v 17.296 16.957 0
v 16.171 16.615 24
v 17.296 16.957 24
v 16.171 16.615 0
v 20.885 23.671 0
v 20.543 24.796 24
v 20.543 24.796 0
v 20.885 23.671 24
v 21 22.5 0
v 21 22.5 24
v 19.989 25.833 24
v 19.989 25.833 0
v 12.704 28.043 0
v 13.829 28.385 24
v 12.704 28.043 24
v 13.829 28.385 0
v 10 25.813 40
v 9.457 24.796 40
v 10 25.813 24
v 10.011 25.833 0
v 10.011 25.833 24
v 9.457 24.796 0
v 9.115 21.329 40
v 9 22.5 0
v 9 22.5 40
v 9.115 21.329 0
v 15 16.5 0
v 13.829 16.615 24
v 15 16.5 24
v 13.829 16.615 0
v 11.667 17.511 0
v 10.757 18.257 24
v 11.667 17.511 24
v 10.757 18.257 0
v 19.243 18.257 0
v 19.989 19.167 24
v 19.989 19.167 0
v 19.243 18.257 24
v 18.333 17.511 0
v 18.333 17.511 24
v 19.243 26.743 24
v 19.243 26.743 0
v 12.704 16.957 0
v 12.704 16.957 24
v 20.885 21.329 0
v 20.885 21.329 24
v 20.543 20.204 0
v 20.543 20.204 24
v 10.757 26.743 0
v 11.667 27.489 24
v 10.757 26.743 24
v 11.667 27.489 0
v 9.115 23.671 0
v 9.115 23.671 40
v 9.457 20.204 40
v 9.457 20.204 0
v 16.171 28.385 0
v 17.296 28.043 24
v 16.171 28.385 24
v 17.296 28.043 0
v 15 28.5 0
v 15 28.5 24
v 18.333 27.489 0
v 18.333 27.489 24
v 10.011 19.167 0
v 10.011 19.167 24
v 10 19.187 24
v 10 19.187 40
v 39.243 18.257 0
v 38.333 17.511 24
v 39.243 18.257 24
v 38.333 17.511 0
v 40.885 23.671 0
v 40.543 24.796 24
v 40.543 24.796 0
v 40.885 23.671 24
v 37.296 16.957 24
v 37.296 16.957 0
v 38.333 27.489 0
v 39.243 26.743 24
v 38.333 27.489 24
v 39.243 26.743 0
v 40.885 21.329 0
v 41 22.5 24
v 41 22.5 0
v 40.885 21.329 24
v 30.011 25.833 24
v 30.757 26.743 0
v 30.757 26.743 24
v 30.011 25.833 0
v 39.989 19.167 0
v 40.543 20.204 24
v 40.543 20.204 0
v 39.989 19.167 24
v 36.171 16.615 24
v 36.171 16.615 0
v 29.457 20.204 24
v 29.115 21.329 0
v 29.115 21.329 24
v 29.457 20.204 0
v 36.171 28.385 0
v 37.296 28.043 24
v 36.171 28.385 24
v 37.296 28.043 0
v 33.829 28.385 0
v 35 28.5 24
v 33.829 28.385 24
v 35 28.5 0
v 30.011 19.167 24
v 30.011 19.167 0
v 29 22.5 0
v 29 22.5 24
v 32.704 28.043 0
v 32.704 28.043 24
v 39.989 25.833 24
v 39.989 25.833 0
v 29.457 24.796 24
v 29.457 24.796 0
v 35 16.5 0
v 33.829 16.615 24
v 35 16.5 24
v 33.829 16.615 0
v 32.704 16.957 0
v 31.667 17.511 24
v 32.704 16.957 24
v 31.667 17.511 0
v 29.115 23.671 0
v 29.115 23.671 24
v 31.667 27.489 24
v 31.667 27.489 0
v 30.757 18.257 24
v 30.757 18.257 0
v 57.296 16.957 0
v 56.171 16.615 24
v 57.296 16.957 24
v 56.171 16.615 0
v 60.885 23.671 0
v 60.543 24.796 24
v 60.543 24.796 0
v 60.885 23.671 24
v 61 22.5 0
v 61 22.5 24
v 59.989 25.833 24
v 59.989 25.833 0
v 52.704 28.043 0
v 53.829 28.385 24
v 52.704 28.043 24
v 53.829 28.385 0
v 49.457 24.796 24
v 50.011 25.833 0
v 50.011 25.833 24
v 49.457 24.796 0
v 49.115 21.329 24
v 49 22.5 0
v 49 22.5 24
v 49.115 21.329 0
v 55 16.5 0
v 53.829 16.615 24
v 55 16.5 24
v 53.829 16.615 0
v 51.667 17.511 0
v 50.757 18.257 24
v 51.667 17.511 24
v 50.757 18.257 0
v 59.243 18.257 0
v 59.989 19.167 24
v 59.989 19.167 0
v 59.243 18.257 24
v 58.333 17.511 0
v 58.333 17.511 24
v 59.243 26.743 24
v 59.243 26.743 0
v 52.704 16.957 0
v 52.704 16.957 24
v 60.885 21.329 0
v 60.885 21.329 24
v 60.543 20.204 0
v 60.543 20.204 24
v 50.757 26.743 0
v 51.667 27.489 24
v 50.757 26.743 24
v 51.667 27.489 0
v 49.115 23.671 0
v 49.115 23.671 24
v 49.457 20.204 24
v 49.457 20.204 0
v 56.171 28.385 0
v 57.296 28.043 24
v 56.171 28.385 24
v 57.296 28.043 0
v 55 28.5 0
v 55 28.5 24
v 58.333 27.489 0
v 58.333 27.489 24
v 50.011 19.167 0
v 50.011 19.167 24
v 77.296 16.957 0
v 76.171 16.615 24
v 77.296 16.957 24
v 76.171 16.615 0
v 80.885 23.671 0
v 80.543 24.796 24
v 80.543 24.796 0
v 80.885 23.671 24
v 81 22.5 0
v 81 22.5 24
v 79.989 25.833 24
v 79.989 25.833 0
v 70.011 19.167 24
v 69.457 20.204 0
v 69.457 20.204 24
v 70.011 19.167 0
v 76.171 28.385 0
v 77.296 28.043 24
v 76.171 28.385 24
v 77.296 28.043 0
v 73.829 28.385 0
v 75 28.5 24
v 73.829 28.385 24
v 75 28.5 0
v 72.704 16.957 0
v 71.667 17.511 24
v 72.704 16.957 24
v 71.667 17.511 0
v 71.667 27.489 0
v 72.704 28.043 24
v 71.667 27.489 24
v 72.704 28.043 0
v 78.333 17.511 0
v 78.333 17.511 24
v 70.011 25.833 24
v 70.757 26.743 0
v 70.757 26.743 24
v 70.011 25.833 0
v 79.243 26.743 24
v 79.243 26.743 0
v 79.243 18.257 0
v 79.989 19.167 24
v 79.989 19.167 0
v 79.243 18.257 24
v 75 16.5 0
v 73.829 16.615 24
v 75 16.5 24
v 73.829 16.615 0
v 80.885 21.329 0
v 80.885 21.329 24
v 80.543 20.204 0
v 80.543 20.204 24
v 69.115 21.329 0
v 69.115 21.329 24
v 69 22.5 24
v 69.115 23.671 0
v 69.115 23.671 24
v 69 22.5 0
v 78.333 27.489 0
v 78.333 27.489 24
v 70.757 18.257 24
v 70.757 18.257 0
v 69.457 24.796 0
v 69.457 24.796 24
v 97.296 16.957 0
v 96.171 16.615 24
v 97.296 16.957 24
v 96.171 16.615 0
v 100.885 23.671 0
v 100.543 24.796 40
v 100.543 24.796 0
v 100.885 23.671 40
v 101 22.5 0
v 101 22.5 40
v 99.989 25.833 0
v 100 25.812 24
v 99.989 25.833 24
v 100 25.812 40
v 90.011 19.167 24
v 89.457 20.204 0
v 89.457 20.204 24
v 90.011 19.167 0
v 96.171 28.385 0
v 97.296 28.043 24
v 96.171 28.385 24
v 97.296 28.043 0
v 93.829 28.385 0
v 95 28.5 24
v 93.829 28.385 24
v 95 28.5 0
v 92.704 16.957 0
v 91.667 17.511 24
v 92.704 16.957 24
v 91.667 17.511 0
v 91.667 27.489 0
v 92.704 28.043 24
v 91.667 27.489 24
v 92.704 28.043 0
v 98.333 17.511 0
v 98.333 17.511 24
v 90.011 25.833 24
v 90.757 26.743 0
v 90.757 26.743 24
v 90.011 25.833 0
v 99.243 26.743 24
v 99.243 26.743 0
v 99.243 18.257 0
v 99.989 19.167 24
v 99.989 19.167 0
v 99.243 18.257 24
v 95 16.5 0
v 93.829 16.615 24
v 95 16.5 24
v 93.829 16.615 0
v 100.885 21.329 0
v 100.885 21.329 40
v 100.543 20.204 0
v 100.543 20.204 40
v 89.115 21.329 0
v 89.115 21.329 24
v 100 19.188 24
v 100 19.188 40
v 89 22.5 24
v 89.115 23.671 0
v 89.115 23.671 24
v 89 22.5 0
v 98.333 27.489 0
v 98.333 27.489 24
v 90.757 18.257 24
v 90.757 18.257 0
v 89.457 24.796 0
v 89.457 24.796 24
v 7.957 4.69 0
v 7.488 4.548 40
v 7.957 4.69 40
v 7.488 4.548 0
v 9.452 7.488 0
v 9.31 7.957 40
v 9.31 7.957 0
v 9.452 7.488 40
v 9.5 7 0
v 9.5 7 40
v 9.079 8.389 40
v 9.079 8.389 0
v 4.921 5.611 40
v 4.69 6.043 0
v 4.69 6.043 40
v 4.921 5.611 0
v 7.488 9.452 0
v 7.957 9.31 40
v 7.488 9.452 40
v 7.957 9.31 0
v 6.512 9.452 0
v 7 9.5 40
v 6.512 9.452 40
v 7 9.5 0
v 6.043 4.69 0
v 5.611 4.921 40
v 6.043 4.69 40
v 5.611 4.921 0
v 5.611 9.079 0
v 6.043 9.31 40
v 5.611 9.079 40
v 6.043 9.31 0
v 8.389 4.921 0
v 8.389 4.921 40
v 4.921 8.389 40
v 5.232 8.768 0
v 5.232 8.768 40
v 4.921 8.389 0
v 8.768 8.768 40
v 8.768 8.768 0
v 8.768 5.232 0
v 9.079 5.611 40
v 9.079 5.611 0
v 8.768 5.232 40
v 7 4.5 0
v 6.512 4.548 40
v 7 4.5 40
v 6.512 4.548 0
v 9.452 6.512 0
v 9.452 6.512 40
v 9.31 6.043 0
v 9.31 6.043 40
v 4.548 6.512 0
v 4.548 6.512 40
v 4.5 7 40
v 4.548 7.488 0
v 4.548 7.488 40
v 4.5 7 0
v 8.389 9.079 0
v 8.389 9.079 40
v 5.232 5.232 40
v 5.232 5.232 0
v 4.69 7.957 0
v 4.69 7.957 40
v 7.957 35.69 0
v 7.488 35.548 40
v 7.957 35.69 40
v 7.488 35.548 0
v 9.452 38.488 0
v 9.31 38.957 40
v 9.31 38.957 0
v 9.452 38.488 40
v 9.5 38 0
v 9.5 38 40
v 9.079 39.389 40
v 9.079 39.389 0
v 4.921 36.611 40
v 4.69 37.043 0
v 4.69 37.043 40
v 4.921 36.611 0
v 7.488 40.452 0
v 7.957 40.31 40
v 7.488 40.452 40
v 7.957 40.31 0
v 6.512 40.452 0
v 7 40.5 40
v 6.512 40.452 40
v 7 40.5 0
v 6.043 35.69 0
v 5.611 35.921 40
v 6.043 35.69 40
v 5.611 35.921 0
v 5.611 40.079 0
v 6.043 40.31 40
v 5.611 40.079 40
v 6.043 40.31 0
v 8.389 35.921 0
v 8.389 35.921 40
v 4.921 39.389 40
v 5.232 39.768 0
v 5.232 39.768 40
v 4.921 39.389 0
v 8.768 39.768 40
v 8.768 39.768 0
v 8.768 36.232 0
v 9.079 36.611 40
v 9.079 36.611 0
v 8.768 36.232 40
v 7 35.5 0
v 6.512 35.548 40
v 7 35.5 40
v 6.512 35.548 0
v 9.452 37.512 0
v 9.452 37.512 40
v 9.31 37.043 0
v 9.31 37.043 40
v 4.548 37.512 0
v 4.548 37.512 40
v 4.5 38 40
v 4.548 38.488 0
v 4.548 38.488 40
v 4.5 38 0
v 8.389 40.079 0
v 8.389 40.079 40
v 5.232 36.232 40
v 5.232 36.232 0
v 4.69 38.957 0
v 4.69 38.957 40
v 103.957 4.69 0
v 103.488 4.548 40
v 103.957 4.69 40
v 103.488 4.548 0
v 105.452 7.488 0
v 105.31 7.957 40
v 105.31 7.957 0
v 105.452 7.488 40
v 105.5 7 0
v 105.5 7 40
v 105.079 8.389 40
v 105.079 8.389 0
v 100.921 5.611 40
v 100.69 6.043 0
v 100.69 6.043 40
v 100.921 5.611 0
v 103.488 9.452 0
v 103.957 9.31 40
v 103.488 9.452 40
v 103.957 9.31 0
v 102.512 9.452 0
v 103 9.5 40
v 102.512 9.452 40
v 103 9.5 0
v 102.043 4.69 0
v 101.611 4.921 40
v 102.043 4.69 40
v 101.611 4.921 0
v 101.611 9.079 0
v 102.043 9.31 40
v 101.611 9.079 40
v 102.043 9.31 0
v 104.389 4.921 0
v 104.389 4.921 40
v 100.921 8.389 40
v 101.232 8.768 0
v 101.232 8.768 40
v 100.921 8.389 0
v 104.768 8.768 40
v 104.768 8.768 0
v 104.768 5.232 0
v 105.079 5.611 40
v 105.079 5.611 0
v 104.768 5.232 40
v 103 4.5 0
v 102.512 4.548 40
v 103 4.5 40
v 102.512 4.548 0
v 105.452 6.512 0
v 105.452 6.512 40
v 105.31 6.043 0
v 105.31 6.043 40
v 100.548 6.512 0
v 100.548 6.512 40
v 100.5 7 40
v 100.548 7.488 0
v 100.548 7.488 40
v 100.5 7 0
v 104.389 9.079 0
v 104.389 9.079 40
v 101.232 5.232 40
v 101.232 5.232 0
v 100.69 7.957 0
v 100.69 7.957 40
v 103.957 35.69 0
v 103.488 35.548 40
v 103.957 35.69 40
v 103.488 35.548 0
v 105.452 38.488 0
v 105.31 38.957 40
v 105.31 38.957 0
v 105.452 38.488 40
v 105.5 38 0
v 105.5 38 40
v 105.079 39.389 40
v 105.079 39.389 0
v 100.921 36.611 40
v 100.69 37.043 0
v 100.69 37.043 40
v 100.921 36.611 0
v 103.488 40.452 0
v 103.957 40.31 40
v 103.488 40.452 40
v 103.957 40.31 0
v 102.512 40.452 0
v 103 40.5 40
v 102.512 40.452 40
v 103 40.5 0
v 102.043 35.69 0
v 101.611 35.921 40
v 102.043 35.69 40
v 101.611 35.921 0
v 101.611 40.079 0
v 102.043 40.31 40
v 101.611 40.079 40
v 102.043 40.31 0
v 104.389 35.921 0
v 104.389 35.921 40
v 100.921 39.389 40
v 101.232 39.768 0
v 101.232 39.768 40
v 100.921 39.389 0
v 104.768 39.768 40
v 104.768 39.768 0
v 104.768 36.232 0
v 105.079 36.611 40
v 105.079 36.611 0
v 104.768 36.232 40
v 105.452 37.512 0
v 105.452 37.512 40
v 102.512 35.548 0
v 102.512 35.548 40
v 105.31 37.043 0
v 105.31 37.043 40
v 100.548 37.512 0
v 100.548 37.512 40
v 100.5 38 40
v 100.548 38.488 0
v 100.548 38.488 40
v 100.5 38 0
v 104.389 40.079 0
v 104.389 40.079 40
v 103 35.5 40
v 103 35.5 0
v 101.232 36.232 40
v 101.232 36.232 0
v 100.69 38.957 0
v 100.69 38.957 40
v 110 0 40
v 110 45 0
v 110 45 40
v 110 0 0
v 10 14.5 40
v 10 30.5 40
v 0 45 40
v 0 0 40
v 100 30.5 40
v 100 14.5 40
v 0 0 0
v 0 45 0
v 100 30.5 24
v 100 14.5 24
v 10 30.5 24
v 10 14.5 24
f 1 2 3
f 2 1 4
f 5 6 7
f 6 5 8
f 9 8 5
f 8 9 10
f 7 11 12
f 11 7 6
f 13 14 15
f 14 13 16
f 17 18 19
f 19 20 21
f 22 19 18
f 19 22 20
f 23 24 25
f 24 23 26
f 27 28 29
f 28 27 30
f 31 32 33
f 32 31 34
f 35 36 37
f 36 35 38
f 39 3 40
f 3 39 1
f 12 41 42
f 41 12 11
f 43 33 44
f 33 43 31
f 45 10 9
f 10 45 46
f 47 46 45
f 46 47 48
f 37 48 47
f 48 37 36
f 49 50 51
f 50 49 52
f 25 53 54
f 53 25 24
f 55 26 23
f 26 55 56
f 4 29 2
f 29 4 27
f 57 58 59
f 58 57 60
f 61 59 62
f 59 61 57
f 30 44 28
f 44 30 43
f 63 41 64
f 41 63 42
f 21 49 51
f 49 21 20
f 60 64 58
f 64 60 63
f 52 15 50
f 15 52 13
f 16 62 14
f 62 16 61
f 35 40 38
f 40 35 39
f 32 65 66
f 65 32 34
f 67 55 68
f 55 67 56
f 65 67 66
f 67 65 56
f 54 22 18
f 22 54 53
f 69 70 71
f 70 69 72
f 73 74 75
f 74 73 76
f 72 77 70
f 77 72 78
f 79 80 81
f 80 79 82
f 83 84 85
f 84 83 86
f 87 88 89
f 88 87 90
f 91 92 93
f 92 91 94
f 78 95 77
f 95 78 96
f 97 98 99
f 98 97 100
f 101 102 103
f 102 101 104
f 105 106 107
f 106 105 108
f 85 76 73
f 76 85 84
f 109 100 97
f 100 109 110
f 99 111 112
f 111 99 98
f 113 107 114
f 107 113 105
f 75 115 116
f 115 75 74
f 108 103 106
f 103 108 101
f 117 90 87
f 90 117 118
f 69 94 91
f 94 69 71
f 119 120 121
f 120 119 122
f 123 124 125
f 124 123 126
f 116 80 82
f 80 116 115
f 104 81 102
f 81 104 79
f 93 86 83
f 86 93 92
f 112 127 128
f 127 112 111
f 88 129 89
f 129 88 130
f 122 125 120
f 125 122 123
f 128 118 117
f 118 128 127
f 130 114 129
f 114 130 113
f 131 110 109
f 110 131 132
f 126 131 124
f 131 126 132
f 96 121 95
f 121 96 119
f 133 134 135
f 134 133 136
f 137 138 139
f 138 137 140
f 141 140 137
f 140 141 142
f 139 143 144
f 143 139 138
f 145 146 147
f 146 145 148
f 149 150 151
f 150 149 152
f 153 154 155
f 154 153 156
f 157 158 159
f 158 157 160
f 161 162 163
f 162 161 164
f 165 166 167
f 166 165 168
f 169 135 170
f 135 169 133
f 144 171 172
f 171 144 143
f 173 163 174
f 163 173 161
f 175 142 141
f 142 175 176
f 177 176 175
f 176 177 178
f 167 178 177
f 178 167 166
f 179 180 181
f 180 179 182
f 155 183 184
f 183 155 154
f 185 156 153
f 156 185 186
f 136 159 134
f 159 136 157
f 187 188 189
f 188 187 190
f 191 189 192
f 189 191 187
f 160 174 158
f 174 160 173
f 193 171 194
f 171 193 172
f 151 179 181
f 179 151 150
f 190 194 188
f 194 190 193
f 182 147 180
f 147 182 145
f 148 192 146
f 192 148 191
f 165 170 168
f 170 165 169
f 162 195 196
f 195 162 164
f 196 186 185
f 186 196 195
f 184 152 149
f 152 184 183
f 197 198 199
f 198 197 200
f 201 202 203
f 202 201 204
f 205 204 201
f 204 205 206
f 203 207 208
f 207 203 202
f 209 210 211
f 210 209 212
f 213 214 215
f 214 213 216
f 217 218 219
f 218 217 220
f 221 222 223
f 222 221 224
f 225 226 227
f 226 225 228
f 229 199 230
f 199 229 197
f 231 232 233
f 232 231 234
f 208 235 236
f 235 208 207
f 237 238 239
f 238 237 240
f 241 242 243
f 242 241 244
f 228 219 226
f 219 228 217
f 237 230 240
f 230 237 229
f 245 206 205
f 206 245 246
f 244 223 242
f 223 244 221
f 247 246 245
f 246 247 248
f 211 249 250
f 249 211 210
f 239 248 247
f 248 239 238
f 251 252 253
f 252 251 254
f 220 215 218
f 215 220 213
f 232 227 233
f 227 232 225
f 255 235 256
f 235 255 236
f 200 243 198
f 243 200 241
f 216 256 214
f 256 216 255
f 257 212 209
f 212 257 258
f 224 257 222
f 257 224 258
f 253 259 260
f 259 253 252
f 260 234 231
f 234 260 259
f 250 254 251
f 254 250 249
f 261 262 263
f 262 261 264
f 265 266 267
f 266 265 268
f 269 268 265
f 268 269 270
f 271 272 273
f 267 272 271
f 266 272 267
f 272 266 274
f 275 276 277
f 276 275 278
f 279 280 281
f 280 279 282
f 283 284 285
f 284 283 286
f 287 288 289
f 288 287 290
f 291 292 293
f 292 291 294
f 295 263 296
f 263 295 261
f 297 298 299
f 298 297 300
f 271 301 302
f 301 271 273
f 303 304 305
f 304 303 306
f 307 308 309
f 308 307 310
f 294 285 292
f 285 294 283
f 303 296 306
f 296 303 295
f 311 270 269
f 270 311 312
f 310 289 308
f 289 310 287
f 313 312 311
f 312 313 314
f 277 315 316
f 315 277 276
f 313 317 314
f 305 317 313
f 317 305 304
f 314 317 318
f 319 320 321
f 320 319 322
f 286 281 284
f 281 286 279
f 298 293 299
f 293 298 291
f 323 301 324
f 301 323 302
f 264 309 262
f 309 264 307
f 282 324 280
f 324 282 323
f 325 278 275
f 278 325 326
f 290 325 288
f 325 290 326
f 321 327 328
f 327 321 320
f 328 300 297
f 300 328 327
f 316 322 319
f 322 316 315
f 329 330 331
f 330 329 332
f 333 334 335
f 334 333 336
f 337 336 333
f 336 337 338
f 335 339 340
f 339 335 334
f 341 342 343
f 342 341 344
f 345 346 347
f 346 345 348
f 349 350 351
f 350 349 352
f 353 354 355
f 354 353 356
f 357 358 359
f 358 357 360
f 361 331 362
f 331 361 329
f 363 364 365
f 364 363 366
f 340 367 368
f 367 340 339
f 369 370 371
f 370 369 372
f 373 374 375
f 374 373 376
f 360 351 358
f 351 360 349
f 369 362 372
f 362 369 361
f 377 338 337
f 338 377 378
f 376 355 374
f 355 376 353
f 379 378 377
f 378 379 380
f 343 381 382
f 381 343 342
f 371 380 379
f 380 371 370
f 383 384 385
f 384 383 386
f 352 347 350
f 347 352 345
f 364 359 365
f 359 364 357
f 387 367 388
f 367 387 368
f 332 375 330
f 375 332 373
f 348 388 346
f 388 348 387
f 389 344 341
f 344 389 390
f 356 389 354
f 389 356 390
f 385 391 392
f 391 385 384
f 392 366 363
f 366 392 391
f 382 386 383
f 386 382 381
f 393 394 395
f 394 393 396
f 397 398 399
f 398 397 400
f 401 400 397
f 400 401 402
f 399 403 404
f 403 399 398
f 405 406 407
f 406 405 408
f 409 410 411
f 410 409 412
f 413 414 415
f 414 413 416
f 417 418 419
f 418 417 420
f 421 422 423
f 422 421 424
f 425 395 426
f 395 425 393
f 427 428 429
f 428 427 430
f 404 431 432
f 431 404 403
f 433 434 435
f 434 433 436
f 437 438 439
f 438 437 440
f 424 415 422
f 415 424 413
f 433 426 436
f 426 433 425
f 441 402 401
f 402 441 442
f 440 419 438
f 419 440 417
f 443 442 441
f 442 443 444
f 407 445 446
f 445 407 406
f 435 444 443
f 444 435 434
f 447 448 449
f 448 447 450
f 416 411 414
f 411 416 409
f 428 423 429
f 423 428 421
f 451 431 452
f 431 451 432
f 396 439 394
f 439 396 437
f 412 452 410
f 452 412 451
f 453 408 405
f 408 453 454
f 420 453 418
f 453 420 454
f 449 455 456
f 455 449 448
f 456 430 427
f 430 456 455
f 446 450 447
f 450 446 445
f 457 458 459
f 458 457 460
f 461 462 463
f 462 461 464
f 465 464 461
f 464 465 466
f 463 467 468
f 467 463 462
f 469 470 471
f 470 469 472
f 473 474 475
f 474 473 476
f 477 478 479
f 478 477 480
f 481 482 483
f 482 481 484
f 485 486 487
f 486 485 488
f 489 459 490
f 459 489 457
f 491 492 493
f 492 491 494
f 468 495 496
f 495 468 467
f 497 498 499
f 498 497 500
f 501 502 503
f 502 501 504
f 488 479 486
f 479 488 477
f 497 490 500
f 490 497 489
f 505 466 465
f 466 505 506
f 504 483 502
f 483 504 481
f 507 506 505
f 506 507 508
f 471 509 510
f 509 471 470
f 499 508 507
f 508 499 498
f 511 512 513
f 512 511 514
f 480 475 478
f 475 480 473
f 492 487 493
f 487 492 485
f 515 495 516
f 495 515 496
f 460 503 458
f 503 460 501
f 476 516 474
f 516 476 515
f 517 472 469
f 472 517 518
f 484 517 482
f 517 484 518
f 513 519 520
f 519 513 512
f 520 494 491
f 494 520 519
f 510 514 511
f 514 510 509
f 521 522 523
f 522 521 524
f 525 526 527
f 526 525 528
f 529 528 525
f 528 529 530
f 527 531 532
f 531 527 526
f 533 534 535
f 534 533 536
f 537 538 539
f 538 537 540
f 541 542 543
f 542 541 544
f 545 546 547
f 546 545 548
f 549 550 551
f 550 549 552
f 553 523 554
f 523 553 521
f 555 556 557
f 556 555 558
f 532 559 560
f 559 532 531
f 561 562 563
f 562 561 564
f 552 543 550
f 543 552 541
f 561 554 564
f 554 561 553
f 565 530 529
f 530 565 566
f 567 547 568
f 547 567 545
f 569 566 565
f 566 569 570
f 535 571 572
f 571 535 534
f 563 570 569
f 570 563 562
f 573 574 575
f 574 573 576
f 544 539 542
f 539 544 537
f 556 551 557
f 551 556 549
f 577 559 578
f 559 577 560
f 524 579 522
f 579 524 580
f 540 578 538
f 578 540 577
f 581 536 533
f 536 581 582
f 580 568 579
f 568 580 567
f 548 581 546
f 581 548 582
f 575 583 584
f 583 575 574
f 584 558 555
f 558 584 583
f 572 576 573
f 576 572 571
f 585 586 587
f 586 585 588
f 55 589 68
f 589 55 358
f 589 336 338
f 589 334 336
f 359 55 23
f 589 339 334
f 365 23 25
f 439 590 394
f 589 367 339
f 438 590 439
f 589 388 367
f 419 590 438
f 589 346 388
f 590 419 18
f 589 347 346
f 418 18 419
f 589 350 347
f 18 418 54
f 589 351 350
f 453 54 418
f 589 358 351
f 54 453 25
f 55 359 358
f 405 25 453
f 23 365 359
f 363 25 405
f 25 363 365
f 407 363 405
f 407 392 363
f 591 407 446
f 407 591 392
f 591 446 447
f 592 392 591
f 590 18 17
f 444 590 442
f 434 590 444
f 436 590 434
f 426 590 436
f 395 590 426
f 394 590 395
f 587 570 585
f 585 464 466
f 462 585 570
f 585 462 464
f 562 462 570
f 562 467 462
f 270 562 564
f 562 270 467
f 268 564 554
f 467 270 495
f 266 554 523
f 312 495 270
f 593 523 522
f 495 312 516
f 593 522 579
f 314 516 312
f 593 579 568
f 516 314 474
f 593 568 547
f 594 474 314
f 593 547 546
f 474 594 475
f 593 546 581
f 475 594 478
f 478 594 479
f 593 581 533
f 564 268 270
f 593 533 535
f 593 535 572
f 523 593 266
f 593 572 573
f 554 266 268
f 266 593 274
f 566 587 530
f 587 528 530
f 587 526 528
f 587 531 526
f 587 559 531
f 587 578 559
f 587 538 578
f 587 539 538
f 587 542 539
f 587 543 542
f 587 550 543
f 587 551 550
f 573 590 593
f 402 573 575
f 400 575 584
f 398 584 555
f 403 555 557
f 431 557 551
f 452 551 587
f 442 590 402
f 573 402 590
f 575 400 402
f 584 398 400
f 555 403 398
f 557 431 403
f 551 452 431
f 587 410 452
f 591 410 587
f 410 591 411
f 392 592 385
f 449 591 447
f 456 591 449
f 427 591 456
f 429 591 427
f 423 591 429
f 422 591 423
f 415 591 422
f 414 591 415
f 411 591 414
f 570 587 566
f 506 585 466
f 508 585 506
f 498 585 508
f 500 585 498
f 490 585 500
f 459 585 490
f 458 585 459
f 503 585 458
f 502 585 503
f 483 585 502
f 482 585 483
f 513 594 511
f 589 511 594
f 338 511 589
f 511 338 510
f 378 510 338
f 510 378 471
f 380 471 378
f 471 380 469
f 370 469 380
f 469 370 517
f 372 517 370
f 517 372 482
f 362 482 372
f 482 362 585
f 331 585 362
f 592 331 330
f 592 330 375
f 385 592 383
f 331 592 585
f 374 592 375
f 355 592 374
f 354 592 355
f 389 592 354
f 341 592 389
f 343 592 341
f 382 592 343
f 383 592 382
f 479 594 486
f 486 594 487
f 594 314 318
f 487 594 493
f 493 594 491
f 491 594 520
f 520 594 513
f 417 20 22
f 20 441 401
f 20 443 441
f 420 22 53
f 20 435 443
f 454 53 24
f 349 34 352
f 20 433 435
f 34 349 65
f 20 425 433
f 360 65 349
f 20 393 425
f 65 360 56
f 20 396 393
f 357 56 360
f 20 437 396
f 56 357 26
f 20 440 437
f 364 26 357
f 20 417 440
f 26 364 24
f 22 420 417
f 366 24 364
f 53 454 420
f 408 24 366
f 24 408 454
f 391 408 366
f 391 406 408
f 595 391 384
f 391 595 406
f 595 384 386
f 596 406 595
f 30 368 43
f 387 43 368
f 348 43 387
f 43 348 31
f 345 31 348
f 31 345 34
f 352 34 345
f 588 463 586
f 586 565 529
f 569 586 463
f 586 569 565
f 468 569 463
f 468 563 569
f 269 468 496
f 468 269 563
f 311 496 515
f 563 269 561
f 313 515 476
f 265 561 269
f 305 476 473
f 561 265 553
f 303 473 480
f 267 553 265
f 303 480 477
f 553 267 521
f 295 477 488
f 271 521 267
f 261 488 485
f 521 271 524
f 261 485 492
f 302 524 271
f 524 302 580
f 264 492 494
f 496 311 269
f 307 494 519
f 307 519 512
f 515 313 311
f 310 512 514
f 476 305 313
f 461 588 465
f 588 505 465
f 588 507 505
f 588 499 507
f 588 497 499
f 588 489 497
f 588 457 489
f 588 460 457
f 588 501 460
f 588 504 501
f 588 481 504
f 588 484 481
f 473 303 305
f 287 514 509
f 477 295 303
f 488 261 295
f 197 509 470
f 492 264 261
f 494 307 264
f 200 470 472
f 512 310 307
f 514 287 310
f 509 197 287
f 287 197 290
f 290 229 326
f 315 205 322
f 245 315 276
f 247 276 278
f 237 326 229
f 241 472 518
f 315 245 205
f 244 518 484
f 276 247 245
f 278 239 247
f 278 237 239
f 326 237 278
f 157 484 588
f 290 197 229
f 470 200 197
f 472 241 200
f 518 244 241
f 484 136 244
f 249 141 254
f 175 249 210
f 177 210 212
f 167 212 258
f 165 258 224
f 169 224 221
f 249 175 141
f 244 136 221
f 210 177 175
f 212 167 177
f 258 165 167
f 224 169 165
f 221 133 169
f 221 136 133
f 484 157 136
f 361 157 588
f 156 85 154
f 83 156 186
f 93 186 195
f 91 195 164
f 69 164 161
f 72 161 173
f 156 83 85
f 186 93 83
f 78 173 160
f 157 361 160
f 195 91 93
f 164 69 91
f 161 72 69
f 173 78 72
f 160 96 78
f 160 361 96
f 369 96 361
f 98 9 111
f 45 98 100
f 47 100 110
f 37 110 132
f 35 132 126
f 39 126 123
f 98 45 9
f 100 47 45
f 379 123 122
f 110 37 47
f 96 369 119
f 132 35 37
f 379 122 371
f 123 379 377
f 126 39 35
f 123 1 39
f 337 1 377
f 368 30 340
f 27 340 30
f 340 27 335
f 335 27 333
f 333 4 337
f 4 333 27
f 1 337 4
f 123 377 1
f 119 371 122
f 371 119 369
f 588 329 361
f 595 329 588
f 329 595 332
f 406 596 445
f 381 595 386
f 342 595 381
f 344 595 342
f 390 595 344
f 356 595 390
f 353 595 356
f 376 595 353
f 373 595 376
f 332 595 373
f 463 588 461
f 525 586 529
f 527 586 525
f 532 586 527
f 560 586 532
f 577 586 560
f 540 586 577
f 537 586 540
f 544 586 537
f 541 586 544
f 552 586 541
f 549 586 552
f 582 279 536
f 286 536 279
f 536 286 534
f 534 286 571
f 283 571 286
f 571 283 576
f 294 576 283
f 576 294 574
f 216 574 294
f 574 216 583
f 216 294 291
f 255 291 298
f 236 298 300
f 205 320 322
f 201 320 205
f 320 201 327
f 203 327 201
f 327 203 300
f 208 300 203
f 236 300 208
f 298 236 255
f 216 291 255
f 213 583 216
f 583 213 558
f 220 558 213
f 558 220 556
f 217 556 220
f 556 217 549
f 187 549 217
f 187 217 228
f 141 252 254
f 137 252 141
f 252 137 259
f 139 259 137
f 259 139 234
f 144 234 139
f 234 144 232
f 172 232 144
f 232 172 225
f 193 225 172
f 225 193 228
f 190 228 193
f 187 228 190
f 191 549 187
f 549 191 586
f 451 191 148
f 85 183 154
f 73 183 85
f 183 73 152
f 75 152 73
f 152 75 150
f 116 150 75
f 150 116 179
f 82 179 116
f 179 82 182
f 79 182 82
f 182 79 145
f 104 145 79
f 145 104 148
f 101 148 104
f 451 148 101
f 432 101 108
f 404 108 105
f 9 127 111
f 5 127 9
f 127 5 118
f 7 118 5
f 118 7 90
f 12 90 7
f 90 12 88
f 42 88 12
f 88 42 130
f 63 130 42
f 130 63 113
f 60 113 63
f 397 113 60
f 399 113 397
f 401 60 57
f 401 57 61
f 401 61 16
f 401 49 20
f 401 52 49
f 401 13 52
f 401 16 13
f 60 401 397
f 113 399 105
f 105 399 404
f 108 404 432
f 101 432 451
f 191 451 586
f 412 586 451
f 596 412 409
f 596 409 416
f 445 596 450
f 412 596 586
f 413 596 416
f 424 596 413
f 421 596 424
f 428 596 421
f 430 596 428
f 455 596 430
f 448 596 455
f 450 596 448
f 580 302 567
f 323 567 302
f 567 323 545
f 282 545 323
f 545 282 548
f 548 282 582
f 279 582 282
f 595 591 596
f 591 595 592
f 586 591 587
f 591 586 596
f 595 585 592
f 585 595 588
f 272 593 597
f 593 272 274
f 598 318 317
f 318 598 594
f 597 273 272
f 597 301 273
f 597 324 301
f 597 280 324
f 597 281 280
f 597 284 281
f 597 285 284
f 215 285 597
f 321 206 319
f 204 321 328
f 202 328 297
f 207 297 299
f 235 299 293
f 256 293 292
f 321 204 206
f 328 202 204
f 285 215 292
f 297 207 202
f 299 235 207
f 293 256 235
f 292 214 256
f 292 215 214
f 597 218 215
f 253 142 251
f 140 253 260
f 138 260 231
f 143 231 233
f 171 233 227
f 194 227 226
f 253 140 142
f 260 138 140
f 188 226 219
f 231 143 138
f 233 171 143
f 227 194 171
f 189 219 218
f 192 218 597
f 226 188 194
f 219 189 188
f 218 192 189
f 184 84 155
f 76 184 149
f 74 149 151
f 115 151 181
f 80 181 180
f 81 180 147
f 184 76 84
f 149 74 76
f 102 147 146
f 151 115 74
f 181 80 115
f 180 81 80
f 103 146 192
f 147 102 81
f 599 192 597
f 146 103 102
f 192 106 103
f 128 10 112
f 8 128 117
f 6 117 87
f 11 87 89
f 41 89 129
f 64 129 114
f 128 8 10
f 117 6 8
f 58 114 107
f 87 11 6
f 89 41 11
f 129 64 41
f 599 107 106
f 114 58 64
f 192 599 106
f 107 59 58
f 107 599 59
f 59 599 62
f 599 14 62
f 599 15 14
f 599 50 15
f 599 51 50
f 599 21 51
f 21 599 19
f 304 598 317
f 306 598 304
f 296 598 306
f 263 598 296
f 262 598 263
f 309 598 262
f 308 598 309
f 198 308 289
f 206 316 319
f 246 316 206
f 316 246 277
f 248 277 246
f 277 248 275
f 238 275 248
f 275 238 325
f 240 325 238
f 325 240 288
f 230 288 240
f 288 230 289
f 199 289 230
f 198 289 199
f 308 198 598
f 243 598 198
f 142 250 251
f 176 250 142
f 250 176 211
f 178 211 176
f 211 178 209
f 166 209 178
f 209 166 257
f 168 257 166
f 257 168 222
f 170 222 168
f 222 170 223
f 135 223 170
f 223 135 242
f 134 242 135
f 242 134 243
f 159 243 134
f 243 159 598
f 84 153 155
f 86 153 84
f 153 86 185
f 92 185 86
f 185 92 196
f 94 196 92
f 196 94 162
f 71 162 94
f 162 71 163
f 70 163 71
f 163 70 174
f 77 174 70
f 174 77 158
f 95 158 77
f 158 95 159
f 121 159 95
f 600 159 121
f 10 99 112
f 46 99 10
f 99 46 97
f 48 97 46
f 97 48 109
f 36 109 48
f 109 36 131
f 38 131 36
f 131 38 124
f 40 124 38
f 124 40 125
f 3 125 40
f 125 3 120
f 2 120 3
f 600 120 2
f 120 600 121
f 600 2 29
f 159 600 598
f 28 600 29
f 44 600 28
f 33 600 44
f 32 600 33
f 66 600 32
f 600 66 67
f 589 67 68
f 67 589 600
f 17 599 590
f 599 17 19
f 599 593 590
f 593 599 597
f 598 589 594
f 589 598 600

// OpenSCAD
$fn = 32;

// ----------------------------------------------------------------------
// Manifold block: gallery_top manifold
// ----------------------------------------------------------------------

// --- parameters (mm) ---
block_l = 110;            // block length, X
block_w = 45;             // block width, Y
block_h = 40;             // block height, Z
port_d = 12;              // port bore diameter
port_pitch = 20;          // port pitch along X
gallery_d = 16;           // top gallery width, Y
gallery_depth = 16;       // gallery pocket depth
wall_p = 10;              // gallery end wall thickness, X
mnt_d = 5;                // mounting hole diameter
mnt_in = 7;               // mounting hole inset from the edges

n_ports = 5;  // ports in the row
port_x0 = (block_l - (n_ports - 1) * port_pitch) / 2;  // first port X

difference() {
  cube([block_l, block_w, block_h]);
  for (i = [0 : n_ports - 1])
    translate([port_x0 + i * port_pitch, block_w / 2, -1])
      cylinder(h = block_h + 2, d = port_d);
  translate([wall_p, block_w / 2 - gallery_d / 2, block_h - gallery_depth])
    cube([block_l - 2 * wall_p, gallery_d, gallery_depth + 1]);
  for (cx = [mnt_in, block_l - mnt_in])
    for (cy = [mnt_in, block_w - mnt_in])
      translate([cx, cy, -1]) cylinder(h = block_h + 2, d = mnt_d);
}
